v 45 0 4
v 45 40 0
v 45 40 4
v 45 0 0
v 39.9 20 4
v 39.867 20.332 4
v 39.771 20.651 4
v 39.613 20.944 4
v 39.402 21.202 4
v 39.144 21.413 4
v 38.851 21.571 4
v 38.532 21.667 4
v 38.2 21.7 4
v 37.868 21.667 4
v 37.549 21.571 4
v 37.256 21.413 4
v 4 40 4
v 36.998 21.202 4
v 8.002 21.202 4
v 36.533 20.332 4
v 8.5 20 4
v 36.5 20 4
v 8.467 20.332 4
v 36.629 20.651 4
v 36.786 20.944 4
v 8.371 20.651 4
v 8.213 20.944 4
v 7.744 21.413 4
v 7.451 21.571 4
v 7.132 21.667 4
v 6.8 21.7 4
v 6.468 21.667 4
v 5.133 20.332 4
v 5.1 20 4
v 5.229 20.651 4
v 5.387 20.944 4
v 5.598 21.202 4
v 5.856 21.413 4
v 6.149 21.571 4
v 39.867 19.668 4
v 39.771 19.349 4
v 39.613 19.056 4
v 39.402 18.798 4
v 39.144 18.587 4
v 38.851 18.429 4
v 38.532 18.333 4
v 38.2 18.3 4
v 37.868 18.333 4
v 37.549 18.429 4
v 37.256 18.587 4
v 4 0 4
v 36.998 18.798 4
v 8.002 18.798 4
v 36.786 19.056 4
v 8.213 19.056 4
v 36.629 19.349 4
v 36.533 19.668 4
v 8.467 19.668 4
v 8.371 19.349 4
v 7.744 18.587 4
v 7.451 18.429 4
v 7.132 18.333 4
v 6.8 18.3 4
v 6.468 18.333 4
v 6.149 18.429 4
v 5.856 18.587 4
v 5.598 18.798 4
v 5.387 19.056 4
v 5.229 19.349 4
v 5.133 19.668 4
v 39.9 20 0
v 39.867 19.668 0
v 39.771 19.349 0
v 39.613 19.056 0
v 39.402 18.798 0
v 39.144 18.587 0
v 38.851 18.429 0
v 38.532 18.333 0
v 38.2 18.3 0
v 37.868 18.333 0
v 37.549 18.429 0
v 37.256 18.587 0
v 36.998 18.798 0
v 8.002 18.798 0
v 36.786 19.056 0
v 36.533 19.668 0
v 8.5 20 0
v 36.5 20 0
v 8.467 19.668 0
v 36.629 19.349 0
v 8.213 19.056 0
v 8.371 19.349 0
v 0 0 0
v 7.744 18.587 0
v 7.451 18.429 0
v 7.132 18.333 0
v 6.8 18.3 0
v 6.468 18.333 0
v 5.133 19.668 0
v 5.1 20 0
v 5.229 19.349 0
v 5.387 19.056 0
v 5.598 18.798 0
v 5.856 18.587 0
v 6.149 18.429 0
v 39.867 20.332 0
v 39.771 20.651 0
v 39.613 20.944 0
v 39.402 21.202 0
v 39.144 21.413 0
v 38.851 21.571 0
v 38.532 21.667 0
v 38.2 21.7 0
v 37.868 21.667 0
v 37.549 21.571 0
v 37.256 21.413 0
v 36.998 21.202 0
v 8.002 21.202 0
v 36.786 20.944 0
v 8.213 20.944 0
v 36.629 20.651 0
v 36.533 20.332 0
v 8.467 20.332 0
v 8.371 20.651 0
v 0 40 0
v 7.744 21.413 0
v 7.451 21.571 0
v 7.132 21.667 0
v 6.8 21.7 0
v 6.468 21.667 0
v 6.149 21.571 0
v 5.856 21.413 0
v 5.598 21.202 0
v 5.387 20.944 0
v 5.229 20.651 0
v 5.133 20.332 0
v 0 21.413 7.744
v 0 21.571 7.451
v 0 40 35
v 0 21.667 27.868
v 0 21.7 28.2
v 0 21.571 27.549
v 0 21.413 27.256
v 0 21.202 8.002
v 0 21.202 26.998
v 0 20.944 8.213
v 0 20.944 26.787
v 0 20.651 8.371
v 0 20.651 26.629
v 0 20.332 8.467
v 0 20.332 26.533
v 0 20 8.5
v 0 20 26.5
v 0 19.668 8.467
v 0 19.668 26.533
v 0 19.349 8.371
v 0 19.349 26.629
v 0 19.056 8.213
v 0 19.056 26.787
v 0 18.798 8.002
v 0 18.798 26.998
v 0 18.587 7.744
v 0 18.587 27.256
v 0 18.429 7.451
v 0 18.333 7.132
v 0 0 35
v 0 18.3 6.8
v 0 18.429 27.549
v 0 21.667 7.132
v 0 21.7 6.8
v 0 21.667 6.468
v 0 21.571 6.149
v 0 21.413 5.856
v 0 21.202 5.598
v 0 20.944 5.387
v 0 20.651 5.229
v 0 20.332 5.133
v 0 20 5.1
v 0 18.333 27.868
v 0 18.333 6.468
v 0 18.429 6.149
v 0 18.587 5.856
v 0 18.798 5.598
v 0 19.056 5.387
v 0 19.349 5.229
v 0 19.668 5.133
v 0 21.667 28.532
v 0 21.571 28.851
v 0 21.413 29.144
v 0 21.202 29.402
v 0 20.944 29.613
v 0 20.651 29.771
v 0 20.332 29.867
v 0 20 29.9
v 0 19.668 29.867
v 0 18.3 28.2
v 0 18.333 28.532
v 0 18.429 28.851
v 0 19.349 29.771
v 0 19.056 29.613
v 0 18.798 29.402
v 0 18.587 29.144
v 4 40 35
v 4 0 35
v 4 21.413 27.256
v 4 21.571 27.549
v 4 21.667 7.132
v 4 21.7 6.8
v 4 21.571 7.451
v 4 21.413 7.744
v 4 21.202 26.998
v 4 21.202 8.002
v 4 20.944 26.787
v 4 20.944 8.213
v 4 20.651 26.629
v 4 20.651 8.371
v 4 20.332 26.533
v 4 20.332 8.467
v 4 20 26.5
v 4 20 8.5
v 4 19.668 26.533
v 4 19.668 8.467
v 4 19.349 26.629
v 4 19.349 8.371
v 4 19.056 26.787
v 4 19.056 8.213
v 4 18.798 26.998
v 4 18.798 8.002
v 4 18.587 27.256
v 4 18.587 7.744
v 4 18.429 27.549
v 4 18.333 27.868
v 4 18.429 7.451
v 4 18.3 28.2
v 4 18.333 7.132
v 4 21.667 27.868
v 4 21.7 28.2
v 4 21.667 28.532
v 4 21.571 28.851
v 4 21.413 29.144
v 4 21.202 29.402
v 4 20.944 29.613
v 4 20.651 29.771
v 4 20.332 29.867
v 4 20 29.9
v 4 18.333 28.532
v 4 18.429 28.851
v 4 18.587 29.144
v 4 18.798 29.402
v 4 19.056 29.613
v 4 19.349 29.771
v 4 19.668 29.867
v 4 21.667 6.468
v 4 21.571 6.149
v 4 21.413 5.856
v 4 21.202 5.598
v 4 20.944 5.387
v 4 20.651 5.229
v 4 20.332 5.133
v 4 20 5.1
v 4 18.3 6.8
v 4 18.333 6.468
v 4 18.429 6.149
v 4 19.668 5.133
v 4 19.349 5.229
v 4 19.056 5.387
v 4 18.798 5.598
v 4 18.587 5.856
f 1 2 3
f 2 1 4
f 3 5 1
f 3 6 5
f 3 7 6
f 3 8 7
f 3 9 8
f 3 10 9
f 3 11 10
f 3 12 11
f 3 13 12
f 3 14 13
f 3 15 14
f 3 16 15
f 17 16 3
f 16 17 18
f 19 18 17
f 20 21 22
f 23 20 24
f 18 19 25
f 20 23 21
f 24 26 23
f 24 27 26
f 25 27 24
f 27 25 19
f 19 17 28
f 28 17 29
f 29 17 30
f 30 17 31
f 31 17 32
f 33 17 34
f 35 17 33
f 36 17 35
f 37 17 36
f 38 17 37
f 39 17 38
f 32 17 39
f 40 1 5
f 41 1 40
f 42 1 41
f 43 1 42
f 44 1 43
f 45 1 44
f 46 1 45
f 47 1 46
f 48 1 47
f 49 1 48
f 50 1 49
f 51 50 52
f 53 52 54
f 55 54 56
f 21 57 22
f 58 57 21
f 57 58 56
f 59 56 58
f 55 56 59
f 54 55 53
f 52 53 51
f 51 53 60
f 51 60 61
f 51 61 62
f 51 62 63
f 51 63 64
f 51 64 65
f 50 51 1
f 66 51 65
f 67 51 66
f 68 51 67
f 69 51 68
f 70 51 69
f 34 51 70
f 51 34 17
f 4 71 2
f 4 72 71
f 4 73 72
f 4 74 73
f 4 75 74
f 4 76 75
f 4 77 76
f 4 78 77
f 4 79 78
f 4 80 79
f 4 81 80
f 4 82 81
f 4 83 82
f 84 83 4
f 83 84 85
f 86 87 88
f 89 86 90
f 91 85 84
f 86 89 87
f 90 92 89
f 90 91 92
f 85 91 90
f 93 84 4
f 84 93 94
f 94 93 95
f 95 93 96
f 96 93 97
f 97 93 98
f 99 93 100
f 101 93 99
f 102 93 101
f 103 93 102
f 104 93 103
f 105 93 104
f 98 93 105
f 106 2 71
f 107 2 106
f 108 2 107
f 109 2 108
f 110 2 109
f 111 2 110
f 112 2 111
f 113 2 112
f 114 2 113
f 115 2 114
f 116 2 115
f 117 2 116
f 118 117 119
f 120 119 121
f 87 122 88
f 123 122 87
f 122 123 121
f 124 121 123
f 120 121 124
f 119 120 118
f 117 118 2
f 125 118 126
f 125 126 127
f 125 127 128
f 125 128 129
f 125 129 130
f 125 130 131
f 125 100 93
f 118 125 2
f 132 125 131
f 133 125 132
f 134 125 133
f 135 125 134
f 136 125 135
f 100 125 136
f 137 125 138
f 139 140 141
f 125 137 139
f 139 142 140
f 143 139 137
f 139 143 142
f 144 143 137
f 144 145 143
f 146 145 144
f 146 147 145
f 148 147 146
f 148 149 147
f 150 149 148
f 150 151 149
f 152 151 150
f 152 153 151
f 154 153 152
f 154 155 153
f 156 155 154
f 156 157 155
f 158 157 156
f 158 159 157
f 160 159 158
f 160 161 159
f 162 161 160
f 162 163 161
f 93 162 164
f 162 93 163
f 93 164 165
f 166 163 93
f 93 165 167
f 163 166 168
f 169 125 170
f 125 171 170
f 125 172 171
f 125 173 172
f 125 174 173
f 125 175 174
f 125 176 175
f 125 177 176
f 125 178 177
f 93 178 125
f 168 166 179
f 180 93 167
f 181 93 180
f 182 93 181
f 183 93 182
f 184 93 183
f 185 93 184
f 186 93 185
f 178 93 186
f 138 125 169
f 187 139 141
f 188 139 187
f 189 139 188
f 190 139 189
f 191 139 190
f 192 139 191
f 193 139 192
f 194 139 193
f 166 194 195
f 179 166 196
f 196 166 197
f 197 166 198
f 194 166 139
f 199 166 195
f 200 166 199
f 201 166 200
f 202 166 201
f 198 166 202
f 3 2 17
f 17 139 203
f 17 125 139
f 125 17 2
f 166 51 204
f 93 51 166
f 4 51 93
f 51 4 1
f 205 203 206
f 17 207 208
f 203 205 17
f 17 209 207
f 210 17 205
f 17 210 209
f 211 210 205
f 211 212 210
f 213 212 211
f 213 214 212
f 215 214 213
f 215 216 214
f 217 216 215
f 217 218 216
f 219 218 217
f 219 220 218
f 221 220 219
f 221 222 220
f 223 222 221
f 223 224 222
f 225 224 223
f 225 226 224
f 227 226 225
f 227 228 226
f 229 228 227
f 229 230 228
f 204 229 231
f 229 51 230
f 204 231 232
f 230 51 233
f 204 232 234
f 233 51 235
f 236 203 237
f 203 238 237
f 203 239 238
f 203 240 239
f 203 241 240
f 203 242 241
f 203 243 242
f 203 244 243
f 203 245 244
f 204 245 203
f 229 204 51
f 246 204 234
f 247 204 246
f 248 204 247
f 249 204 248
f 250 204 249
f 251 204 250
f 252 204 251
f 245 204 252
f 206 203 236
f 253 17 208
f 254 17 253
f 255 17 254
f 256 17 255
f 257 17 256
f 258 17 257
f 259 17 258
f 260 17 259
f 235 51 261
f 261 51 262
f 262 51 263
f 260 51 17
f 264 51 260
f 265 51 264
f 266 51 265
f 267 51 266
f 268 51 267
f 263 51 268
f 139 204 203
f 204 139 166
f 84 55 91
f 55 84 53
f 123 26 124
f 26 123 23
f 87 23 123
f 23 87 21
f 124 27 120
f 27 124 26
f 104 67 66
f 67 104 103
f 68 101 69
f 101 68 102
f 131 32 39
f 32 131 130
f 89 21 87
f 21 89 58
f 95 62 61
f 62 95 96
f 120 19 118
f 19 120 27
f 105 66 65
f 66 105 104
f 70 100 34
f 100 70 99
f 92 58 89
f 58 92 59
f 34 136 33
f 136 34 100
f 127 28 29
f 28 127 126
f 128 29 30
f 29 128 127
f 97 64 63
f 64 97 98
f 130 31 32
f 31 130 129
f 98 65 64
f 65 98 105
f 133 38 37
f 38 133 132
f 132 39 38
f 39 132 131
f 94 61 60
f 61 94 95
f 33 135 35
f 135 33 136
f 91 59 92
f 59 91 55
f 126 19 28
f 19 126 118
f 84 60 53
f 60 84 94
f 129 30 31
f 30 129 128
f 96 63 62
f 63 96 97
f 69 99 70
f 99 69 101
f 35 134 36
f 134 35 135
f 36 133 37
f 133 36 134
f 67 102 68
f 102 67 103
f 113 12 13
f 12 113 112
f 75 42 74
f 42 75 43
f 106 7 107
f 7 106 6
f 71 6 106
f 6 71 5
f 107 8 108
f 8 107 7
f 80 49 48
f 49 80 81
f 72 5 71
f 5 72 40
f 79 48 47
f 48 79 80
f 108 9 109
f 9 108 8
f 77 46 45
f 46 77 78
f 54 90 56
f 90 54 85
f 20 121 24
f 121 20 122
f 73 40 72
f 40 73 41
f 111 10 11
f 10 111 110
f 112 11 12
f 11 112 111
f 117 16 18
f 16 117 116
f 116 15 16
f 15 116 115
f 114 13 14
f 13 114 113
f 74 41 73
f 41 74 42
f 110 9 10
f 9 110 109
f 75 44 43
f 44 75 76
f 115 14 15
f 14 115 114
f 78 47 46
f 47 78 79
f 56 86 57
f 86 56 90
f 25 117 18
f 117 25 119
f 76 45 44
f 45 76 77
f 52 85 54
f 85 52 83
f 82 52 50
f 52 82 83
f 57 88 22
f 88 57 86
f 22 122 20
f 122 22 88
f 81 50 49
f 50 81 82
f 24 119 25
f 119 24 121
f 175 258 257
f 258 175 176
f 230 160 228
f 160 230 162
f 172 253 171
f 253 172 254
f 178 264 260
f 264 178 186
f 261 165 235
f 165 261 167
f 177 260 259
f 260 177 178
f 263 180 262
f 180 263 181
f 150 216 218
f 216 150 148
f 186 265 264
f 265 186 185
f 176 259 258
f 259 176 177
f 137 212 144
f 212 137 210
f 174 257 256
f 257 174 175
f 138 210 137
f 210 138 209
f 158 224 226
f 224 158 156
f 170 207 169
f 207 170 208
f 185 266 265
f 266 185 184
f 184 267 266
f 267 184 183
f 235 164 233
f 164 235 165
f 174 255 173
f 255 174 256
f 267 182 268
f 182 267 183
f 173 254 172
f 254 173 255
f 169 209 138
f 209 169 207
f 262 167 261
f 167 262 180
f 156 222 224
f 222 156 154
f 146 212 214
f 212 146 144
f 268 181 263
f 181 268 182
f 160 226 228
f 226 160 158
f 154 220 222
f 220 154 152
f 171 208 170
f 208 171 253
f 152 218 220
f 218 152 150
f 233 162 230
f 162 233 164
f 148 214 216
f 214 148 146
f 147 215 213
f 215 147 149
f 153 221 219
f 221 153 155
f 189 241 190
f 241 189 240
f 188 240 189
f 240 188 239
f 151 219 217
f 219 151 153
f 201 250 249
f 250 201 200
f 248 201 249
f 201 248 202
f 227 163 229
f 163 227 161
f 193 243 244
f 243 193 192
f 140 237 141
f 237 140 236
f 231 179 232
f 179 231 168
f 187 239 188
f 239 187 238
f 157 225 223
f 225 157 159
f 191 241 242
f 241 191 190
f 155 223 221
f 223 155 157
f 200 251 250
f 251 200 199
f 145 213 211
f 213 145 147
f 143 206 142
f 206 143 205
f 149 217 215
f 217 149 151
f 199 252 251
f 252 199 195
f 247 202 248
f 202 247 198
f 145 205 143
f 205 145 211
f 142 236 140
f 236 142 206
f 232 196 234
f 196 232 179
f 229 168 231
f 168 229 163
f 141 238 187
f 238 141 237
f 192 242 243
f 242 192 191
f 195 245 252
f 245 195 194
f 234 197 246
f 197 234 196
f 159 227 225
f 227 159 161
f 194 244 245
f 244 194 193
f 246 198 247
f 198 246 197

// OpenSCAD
$fn = 32;

// ----------------------------------------------------------------------
// L-bracket: 45 x 40 x 35 mm
// ----------------------------------------------------------------------

// --- parameters (mm) ---
arm_x = 45;               // horizontal leg, X
arm_z = 35;               // vertical leg, Z
width = 40;               // bracket depth, Y
wall = 4;                 // plate thickness
hole_d = 3.4;             // clearance for M3

module hole_z(px, py) {
  translate([px, py, -2.5]) cylinder(h = wall + 5, d = hole_d);
}
module hole_x(pz, py) {
  translate([-2.5, py, pz]) rotate([0, 90, 0]) cylinder(h = wall + 5, d = hole_d);
}

difference() {
  union() {
    /* horizontal leg */
    cube([arm_x, width, wall]);
    /* vertical leg, overlapping the corner block */
    cube([wall, width, arm_z]);
  }
  hole_z(6.8, 20);
  hole_z(38.2, 20);
  hole_x(6.8, 20);
  hole_x(28.2, 20);
}
